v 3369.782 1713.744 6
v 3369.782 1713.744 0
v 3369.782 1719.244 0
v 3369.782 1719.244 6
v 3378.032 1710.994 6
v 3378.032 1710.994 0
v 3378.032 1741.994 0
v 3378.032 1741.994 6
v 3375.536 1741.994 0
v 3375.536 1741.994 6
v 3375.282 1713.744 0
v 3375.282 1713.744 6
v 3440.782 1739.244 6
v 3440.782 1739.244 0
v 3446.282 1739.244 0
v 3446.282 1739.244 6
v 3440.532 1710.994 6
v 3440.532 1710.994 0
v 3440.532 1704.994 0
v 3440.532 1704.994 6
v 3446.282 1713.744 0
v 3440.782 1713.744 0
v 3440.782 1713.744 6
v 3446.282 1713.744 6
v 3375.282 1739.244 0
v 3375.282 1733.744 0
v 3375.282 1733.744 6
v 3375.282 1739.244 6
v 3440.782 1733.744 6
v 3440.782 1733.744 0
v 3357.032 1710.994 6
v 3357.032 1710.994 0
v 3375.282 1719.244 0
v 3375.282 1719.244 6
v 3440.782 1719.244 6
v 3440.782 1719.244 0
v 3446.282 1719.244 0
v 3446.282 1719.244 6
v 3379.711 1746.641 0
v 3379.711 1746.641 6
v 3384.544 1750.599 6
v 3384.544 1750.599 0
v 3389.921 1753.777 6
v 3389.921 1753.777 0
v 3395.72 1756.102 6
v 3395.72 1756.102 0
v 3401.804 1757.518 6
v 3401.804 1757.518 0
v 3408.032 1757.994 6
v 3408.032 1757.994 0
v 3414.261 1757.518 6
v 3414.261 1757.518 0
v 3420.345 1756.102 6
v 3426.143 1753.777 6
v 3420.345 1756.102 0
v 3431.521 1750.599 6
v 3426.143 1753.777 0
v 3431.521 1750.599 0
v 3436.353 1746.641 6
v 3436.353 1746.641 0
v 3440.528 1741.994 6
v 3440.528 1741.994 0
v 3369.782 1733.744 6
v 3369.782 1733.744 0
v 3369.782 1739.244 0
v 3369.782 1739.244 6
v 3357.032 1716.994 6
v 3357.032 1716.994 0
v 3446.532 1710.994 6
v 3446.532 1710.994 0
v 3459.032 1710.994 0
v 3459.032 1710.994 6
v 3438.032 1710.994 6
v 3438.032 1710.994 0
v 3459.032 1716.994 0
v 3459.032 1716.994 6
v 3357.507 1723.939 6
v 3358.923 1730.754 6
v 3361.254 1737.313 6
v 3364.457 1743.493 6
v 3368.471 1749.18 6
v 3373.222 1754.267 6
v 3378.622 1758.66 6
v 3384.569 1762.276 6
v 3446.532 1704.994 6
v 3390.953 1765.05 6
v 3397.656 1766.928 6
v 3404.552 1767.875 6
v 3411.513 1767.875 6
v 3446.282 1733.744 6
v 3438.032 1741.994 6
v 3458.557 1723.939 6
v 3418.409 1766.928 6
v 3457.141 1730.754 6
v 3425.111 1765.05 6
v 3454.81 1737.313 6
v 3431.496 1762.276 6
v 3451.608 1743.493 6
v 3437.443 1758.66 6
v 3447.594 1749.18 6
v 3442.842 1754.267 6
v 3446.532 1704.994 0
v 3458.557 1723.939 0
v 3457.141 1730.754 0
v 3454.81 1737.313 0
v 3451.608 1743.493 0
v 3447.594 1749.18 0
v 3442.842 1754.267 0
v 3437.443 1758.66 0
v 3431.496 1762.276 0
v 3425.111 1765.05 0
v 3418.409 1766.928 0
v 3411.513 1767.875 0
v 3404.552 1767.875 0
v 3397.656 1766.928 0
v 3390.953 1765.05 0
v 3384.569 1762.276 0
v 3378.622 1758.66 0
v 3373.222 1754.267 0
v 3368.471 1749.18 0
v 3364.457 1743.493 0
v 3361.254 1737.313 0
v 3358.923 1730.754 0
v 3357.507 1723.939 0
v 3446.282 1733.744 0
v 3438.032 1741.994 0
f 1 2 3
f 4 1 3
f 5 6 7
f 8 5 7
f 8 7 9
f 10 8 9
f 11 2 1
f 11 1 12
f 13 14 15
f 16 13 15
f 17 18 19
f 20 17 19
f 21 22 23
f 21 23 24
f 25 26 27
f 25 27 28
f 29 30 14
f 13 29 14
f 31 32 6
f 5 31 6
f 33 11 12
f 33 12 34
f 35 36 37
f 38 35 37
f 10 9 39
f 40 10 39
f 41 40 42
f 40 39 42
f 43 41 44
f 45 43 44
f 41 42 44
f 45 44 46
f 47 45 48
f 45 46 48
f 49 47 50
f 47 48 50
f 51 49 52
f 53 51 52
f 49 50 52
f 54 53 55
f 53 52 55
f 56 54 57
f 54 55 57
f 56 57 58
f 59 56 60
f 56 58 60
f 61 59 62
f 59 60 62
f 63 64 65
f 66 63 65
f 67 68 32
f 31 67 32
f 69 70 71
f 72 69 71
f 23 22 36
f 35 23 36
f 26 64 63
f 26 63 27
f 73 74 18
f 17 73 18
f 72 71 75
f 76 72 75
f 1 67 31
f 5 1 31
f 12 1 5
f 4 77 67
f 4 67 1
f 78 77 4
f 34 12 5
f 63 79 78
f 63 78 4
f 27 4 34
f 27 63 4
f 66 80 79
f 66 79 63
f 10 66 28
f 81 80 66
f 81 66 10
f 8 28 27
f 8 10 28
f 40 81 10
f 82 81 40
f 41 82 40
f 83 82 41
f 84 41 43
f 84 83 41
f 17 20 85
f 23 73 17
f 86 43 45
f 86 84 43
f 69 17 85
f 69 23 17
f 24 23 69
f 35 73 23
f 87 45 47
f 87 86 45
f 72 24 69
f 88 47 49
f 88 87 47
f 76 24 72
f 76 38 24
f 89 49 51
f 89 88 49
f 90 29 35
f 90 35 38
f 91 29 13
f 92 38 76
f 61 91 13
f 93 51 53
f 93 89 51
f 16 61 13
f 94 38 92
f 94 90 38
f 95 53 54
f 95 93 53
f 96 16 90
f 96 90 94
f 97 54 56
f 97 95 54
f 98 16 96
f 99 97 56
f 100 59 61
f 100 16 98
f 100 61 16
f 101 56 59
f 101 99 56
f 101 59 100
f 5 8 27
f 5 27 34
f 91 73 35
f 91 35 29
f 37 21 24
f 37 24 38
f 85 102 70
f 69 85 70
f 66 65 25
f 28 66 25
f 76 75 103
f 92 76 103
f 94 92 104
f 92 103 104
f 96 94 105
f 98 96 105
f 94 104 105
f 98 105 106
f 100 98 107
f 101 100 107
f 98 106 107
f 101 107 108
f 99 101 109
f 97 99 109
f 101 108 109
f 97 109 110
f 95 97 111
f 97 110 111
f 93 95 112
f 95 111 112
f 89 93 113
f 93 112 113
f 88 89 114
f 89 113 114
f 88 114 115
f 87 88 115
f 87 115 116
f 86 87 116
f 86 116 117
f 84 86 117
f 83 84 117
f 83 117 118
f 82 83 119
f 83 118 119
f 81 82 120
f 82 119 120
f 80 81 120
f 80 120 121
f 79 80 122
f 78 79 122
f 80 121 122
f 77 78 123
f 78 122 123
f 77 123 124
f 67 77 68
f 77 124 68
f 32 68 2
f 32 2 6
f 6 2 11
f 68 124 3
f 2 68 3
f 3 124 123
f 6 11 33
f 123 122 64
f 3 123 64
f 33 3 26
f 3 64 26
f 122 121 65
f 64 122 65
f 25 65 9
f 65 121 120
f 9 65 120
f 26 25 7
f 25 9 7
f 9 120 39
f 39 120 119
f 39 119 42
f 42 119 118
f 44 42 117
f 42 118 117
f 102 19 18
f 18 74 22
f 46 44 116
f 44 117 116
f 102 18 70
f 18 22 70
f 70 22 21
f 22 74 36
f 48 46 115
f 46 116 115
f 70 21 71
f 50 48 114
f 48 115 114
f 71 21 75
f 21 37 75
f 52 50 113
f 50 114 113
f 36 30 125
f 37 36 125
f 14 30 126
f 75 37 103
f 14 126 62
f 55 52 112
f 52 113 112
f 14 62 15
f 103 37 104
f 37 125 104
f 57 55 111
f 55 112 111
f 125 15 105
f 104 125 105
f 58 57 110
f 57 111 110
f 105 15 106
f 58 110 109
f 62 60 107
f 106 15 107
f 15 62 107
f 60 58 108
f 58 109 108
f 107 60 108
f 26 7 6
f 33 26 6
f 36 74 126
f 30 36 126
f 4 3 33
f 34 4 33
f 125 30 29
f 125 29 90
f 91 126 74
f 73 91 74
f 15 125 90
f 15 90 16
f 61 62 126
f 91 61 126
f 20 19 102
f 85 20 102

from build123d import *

# Parameters (mm, degrees)
MODEL_W             = 5.5
MODEL_H             = 5.5
BOSS_EXTRUDE1_DEPTH = 6


with BuildPart() as part:
    # Model → Boss-Extrude1 (new body)
    with BuildSketch(Plane.XY):
        with BuildLine():
            Line((3357.032259061, 1716.994350869), (3357.032259061, 1710.994350869))
            Line((3357.032259061, 1710.994350869), (3367.032259061, 1710.994350869))
            Line((3367.032259061, 1710.994350869), (3378.032259061, 1710.994350869))
            Line((3378.032259061, 1710.994350869), (3378.032259061, 1741.994350869))
            Line((3378.032259061, 1741.994350869), (3375.536105442, 1741.994350869))
            ThreePointArc((3375.536105442, 1741.994350869), (3408.032259061, 1757.994350869), (3440.528412679, 1741.994350869))
            Line((3440.528412679, 1741.994350869), (3438.032259061, 1741.994350869))
            Line((3438.032259061, 1741.994350869), (3438.032259061, 1710.994350869))
            Line((3438.032259061, 1710.994350869), (3440.532259061, 1710.994350869))
            Line((3440.532259061, 1710.994350869), (3440.532259061, 1704.994350869))
            Line((3440.532259061, 1704.994350869), (3446.532259061, 1704.994350869))
            Line((3446.532259061, 1704.994350869), (3446.532259061, 1710.994350869))
            Line((3446.532259061, 1710.994350869), (3459.032259061, 1710.994350869))
            Line((3459.032259061, 1710.994350869), (3459.032259061, 1716.994350869))
            ThreePointArc((3459.032259061, 1716.994350869), (3408.032259061, 1767.994350869), (3357.032259061, 1716.994350869))
        make_face()
        with Locations((3443.532259061, 1716.494350869)):
            Rectangle(MODEL_W, MODEL_H, mode=Mode.SUBTRACT)
        with Locations((3443.532259061, 1736.494350869)):
            Rectangle(MODEL_W, MODEL_H, mode=Mode.SUBTRACT)
        with Locations((3372.532259061, 1716.494350869)):
            Rectangle(MODEL_W, MODEL_H, mode=Mode.SUBTRACT)
        with Locations((3372.532259061, 1736.494350869)):
            Rectangle(MODEL_W, MODEL_H, mode=Mode.SUBTRACT)
    extrude(amount=BOSS_EXTRUDE1_DEPTH)


solid = part.part
